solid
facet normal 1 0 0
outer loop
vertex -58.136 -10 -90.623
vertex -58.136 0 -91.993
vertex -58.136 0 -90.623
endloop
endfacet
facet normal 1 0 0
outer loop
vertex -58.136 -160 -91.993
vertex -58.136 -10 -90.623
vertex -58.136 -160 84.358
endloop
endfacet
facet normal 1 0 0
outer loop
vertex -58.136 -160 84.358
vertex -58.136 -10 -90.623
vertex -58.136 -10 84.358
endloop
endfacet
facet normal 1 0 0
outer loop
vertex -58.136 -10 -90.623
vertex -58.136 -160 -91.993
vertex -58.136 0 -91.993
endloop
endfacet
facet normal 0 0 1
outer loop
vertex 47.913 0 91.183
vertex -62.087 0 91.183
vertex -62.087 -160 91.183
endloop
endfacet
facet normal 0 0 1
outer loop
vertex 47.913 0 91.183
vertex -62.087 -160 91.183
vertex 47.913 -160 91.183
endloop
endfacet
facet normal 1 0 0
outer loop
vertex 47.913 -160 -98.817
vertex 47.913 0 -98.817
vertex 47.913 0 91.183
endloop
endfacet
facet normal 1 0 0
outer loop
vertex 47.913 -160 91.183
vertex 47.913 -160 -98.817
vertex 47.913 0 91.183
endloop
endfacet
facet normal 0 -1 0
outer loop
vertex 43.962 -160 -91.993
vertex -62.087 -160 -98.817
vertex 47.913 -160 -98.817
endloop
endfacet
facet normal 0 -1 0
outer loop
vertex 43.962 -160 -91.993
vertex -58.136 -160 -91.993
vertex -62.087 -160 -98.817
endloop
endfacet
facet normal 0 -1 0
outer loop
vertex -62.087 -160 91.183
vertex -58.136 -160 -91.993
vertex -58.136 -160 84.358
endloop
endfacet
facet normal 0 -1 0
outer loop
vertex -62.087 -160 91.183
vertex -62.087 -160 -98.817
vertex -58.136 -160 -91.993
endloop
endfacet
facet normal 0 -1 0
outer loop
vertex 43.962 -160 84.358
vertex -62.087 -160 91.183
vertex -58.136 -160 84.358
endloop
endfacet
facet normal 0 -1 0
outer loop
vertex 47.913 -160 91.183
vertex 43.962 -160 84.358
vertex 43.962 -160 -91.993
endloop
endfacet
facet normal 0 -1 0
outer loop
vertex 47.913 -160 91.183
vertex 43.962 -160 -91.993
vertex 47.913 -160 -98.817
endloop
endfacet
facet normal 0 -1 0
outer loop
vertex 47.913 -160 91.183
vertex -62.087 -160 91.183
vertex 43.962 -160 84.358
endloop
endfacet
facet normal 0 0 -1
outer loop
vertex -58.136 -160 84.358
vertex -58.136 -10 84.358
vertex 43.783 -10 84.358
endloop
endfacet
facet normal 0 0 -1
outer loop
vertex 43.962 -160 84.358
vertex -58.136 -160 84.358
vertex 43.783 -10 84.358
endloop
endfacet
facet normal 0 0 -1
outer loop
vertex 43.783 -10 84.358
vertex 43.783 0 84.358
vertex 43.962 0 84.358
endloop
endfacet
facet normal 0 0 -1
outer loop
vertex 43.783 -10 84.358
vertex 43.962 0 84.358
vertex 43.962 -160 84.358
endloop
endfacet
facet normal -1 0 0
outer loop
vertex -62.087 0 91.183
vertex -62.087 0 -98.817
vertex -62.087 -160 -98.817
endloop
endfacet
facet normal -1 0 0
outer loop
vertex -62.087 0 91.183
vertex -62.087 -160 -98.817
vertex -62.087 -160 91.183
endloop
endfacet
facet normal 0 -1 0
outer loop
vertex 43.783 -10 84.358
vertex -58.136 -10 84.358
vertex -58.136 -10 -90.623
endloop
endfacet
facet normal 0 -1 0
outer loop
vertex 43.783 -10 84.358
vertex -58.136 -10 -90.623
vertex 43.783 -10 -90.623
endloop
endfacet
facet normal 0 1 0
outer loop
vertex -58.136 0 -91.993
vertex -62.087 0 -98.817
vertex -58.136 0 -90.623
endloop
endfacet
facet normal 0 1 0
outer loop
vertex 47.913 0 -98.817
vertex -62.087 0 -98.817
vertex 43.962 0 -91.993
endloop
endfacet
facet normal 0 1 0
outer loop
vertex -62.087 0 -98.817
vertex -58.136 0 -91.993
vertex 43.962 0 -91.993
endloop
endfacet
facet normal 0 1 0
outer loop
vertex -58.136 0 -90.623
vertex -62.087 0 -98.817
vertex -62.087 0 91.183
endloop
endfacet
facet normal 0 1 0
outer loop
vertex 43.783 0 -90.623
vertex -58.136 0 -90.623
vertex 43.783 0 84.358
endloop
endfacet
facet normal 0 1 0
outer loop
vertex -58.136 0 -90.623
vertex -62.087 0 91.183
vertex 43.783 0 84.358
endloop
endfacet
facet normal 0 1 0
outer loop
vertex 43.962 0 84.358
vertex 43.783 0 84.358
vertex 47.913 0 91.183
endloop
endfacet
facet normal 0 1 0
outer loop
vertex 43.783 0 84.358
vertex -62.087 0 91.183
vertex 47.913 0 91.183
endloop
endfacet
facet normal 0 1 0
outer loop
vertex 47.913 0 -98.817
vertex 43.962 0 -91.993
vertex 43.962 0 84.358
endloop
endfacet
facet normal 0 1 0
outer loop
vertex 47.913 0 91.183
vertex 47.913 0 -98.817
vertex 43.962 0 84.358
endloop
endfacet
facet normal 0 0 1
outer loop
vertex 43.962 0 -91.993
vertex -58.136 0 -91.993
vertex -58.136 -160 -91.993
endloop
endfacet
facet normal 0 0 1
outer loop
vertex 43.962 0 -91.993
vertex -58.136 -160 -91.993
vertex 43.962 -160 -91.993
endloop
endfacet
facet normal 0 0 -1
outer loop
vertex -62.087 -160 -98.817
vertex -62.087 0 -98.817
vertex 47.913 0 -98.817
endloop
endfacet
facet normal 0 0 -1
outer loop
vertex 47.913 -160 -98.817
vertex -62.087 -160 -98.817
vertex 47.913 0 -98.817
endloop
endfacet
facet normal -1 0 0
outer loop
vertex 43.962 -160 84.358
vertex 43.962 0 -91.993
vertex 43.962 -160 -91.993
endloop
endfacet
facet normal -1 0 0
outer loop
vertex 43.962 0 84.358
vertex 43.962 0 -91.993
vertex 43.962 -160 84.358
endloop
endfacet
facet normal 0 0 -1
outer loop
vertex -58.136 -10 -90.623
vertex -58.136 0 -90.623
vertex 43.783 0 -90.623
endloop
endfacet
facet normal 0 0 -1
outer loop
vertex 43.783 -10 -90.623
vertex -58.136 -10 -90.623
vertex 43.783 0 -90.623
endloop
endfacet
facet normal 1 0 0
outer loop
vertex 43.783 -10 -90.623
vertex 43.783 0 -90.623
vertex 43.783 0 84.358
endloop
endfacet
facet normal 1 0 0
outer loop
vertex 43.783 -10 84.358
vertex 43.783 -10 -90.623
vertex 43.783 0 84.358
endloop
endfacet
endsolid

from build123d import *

# Parameters (mm, degrees)
F0_W     = 110
F0_H     = 190
F0_W_2   = 102.098083
F0_H_2   = 176.351235
F1_DEPTH = 160
F2_W     = 103.17653
F2_H     = 175.133594
F3_DEPTH = 10


with BuildPart() as f1:
    # F0 (on Front) → F1 (new body)
    with BuildSketch(Plane.XZ):
        with Locations((-7.087325, -3.817271)):
            Rectangle(F0_W, F0_H)
        with Locations((-7.087326, -3.817271)):
            Rectangle(F0_W_2, F0_H_2, mode=Mode.SUBTRACT)
    extrude(amount=F1_DEPTH)

    # F2 (on Front) → F3 (join)
    with BuildSketch(Plane.XZ):
        with Locations((-7.804865, -3.055822)):
            Rectangle(F2_W, F2_H)
    extrude(amount=F3_DEPTH)


solid = f1.part
